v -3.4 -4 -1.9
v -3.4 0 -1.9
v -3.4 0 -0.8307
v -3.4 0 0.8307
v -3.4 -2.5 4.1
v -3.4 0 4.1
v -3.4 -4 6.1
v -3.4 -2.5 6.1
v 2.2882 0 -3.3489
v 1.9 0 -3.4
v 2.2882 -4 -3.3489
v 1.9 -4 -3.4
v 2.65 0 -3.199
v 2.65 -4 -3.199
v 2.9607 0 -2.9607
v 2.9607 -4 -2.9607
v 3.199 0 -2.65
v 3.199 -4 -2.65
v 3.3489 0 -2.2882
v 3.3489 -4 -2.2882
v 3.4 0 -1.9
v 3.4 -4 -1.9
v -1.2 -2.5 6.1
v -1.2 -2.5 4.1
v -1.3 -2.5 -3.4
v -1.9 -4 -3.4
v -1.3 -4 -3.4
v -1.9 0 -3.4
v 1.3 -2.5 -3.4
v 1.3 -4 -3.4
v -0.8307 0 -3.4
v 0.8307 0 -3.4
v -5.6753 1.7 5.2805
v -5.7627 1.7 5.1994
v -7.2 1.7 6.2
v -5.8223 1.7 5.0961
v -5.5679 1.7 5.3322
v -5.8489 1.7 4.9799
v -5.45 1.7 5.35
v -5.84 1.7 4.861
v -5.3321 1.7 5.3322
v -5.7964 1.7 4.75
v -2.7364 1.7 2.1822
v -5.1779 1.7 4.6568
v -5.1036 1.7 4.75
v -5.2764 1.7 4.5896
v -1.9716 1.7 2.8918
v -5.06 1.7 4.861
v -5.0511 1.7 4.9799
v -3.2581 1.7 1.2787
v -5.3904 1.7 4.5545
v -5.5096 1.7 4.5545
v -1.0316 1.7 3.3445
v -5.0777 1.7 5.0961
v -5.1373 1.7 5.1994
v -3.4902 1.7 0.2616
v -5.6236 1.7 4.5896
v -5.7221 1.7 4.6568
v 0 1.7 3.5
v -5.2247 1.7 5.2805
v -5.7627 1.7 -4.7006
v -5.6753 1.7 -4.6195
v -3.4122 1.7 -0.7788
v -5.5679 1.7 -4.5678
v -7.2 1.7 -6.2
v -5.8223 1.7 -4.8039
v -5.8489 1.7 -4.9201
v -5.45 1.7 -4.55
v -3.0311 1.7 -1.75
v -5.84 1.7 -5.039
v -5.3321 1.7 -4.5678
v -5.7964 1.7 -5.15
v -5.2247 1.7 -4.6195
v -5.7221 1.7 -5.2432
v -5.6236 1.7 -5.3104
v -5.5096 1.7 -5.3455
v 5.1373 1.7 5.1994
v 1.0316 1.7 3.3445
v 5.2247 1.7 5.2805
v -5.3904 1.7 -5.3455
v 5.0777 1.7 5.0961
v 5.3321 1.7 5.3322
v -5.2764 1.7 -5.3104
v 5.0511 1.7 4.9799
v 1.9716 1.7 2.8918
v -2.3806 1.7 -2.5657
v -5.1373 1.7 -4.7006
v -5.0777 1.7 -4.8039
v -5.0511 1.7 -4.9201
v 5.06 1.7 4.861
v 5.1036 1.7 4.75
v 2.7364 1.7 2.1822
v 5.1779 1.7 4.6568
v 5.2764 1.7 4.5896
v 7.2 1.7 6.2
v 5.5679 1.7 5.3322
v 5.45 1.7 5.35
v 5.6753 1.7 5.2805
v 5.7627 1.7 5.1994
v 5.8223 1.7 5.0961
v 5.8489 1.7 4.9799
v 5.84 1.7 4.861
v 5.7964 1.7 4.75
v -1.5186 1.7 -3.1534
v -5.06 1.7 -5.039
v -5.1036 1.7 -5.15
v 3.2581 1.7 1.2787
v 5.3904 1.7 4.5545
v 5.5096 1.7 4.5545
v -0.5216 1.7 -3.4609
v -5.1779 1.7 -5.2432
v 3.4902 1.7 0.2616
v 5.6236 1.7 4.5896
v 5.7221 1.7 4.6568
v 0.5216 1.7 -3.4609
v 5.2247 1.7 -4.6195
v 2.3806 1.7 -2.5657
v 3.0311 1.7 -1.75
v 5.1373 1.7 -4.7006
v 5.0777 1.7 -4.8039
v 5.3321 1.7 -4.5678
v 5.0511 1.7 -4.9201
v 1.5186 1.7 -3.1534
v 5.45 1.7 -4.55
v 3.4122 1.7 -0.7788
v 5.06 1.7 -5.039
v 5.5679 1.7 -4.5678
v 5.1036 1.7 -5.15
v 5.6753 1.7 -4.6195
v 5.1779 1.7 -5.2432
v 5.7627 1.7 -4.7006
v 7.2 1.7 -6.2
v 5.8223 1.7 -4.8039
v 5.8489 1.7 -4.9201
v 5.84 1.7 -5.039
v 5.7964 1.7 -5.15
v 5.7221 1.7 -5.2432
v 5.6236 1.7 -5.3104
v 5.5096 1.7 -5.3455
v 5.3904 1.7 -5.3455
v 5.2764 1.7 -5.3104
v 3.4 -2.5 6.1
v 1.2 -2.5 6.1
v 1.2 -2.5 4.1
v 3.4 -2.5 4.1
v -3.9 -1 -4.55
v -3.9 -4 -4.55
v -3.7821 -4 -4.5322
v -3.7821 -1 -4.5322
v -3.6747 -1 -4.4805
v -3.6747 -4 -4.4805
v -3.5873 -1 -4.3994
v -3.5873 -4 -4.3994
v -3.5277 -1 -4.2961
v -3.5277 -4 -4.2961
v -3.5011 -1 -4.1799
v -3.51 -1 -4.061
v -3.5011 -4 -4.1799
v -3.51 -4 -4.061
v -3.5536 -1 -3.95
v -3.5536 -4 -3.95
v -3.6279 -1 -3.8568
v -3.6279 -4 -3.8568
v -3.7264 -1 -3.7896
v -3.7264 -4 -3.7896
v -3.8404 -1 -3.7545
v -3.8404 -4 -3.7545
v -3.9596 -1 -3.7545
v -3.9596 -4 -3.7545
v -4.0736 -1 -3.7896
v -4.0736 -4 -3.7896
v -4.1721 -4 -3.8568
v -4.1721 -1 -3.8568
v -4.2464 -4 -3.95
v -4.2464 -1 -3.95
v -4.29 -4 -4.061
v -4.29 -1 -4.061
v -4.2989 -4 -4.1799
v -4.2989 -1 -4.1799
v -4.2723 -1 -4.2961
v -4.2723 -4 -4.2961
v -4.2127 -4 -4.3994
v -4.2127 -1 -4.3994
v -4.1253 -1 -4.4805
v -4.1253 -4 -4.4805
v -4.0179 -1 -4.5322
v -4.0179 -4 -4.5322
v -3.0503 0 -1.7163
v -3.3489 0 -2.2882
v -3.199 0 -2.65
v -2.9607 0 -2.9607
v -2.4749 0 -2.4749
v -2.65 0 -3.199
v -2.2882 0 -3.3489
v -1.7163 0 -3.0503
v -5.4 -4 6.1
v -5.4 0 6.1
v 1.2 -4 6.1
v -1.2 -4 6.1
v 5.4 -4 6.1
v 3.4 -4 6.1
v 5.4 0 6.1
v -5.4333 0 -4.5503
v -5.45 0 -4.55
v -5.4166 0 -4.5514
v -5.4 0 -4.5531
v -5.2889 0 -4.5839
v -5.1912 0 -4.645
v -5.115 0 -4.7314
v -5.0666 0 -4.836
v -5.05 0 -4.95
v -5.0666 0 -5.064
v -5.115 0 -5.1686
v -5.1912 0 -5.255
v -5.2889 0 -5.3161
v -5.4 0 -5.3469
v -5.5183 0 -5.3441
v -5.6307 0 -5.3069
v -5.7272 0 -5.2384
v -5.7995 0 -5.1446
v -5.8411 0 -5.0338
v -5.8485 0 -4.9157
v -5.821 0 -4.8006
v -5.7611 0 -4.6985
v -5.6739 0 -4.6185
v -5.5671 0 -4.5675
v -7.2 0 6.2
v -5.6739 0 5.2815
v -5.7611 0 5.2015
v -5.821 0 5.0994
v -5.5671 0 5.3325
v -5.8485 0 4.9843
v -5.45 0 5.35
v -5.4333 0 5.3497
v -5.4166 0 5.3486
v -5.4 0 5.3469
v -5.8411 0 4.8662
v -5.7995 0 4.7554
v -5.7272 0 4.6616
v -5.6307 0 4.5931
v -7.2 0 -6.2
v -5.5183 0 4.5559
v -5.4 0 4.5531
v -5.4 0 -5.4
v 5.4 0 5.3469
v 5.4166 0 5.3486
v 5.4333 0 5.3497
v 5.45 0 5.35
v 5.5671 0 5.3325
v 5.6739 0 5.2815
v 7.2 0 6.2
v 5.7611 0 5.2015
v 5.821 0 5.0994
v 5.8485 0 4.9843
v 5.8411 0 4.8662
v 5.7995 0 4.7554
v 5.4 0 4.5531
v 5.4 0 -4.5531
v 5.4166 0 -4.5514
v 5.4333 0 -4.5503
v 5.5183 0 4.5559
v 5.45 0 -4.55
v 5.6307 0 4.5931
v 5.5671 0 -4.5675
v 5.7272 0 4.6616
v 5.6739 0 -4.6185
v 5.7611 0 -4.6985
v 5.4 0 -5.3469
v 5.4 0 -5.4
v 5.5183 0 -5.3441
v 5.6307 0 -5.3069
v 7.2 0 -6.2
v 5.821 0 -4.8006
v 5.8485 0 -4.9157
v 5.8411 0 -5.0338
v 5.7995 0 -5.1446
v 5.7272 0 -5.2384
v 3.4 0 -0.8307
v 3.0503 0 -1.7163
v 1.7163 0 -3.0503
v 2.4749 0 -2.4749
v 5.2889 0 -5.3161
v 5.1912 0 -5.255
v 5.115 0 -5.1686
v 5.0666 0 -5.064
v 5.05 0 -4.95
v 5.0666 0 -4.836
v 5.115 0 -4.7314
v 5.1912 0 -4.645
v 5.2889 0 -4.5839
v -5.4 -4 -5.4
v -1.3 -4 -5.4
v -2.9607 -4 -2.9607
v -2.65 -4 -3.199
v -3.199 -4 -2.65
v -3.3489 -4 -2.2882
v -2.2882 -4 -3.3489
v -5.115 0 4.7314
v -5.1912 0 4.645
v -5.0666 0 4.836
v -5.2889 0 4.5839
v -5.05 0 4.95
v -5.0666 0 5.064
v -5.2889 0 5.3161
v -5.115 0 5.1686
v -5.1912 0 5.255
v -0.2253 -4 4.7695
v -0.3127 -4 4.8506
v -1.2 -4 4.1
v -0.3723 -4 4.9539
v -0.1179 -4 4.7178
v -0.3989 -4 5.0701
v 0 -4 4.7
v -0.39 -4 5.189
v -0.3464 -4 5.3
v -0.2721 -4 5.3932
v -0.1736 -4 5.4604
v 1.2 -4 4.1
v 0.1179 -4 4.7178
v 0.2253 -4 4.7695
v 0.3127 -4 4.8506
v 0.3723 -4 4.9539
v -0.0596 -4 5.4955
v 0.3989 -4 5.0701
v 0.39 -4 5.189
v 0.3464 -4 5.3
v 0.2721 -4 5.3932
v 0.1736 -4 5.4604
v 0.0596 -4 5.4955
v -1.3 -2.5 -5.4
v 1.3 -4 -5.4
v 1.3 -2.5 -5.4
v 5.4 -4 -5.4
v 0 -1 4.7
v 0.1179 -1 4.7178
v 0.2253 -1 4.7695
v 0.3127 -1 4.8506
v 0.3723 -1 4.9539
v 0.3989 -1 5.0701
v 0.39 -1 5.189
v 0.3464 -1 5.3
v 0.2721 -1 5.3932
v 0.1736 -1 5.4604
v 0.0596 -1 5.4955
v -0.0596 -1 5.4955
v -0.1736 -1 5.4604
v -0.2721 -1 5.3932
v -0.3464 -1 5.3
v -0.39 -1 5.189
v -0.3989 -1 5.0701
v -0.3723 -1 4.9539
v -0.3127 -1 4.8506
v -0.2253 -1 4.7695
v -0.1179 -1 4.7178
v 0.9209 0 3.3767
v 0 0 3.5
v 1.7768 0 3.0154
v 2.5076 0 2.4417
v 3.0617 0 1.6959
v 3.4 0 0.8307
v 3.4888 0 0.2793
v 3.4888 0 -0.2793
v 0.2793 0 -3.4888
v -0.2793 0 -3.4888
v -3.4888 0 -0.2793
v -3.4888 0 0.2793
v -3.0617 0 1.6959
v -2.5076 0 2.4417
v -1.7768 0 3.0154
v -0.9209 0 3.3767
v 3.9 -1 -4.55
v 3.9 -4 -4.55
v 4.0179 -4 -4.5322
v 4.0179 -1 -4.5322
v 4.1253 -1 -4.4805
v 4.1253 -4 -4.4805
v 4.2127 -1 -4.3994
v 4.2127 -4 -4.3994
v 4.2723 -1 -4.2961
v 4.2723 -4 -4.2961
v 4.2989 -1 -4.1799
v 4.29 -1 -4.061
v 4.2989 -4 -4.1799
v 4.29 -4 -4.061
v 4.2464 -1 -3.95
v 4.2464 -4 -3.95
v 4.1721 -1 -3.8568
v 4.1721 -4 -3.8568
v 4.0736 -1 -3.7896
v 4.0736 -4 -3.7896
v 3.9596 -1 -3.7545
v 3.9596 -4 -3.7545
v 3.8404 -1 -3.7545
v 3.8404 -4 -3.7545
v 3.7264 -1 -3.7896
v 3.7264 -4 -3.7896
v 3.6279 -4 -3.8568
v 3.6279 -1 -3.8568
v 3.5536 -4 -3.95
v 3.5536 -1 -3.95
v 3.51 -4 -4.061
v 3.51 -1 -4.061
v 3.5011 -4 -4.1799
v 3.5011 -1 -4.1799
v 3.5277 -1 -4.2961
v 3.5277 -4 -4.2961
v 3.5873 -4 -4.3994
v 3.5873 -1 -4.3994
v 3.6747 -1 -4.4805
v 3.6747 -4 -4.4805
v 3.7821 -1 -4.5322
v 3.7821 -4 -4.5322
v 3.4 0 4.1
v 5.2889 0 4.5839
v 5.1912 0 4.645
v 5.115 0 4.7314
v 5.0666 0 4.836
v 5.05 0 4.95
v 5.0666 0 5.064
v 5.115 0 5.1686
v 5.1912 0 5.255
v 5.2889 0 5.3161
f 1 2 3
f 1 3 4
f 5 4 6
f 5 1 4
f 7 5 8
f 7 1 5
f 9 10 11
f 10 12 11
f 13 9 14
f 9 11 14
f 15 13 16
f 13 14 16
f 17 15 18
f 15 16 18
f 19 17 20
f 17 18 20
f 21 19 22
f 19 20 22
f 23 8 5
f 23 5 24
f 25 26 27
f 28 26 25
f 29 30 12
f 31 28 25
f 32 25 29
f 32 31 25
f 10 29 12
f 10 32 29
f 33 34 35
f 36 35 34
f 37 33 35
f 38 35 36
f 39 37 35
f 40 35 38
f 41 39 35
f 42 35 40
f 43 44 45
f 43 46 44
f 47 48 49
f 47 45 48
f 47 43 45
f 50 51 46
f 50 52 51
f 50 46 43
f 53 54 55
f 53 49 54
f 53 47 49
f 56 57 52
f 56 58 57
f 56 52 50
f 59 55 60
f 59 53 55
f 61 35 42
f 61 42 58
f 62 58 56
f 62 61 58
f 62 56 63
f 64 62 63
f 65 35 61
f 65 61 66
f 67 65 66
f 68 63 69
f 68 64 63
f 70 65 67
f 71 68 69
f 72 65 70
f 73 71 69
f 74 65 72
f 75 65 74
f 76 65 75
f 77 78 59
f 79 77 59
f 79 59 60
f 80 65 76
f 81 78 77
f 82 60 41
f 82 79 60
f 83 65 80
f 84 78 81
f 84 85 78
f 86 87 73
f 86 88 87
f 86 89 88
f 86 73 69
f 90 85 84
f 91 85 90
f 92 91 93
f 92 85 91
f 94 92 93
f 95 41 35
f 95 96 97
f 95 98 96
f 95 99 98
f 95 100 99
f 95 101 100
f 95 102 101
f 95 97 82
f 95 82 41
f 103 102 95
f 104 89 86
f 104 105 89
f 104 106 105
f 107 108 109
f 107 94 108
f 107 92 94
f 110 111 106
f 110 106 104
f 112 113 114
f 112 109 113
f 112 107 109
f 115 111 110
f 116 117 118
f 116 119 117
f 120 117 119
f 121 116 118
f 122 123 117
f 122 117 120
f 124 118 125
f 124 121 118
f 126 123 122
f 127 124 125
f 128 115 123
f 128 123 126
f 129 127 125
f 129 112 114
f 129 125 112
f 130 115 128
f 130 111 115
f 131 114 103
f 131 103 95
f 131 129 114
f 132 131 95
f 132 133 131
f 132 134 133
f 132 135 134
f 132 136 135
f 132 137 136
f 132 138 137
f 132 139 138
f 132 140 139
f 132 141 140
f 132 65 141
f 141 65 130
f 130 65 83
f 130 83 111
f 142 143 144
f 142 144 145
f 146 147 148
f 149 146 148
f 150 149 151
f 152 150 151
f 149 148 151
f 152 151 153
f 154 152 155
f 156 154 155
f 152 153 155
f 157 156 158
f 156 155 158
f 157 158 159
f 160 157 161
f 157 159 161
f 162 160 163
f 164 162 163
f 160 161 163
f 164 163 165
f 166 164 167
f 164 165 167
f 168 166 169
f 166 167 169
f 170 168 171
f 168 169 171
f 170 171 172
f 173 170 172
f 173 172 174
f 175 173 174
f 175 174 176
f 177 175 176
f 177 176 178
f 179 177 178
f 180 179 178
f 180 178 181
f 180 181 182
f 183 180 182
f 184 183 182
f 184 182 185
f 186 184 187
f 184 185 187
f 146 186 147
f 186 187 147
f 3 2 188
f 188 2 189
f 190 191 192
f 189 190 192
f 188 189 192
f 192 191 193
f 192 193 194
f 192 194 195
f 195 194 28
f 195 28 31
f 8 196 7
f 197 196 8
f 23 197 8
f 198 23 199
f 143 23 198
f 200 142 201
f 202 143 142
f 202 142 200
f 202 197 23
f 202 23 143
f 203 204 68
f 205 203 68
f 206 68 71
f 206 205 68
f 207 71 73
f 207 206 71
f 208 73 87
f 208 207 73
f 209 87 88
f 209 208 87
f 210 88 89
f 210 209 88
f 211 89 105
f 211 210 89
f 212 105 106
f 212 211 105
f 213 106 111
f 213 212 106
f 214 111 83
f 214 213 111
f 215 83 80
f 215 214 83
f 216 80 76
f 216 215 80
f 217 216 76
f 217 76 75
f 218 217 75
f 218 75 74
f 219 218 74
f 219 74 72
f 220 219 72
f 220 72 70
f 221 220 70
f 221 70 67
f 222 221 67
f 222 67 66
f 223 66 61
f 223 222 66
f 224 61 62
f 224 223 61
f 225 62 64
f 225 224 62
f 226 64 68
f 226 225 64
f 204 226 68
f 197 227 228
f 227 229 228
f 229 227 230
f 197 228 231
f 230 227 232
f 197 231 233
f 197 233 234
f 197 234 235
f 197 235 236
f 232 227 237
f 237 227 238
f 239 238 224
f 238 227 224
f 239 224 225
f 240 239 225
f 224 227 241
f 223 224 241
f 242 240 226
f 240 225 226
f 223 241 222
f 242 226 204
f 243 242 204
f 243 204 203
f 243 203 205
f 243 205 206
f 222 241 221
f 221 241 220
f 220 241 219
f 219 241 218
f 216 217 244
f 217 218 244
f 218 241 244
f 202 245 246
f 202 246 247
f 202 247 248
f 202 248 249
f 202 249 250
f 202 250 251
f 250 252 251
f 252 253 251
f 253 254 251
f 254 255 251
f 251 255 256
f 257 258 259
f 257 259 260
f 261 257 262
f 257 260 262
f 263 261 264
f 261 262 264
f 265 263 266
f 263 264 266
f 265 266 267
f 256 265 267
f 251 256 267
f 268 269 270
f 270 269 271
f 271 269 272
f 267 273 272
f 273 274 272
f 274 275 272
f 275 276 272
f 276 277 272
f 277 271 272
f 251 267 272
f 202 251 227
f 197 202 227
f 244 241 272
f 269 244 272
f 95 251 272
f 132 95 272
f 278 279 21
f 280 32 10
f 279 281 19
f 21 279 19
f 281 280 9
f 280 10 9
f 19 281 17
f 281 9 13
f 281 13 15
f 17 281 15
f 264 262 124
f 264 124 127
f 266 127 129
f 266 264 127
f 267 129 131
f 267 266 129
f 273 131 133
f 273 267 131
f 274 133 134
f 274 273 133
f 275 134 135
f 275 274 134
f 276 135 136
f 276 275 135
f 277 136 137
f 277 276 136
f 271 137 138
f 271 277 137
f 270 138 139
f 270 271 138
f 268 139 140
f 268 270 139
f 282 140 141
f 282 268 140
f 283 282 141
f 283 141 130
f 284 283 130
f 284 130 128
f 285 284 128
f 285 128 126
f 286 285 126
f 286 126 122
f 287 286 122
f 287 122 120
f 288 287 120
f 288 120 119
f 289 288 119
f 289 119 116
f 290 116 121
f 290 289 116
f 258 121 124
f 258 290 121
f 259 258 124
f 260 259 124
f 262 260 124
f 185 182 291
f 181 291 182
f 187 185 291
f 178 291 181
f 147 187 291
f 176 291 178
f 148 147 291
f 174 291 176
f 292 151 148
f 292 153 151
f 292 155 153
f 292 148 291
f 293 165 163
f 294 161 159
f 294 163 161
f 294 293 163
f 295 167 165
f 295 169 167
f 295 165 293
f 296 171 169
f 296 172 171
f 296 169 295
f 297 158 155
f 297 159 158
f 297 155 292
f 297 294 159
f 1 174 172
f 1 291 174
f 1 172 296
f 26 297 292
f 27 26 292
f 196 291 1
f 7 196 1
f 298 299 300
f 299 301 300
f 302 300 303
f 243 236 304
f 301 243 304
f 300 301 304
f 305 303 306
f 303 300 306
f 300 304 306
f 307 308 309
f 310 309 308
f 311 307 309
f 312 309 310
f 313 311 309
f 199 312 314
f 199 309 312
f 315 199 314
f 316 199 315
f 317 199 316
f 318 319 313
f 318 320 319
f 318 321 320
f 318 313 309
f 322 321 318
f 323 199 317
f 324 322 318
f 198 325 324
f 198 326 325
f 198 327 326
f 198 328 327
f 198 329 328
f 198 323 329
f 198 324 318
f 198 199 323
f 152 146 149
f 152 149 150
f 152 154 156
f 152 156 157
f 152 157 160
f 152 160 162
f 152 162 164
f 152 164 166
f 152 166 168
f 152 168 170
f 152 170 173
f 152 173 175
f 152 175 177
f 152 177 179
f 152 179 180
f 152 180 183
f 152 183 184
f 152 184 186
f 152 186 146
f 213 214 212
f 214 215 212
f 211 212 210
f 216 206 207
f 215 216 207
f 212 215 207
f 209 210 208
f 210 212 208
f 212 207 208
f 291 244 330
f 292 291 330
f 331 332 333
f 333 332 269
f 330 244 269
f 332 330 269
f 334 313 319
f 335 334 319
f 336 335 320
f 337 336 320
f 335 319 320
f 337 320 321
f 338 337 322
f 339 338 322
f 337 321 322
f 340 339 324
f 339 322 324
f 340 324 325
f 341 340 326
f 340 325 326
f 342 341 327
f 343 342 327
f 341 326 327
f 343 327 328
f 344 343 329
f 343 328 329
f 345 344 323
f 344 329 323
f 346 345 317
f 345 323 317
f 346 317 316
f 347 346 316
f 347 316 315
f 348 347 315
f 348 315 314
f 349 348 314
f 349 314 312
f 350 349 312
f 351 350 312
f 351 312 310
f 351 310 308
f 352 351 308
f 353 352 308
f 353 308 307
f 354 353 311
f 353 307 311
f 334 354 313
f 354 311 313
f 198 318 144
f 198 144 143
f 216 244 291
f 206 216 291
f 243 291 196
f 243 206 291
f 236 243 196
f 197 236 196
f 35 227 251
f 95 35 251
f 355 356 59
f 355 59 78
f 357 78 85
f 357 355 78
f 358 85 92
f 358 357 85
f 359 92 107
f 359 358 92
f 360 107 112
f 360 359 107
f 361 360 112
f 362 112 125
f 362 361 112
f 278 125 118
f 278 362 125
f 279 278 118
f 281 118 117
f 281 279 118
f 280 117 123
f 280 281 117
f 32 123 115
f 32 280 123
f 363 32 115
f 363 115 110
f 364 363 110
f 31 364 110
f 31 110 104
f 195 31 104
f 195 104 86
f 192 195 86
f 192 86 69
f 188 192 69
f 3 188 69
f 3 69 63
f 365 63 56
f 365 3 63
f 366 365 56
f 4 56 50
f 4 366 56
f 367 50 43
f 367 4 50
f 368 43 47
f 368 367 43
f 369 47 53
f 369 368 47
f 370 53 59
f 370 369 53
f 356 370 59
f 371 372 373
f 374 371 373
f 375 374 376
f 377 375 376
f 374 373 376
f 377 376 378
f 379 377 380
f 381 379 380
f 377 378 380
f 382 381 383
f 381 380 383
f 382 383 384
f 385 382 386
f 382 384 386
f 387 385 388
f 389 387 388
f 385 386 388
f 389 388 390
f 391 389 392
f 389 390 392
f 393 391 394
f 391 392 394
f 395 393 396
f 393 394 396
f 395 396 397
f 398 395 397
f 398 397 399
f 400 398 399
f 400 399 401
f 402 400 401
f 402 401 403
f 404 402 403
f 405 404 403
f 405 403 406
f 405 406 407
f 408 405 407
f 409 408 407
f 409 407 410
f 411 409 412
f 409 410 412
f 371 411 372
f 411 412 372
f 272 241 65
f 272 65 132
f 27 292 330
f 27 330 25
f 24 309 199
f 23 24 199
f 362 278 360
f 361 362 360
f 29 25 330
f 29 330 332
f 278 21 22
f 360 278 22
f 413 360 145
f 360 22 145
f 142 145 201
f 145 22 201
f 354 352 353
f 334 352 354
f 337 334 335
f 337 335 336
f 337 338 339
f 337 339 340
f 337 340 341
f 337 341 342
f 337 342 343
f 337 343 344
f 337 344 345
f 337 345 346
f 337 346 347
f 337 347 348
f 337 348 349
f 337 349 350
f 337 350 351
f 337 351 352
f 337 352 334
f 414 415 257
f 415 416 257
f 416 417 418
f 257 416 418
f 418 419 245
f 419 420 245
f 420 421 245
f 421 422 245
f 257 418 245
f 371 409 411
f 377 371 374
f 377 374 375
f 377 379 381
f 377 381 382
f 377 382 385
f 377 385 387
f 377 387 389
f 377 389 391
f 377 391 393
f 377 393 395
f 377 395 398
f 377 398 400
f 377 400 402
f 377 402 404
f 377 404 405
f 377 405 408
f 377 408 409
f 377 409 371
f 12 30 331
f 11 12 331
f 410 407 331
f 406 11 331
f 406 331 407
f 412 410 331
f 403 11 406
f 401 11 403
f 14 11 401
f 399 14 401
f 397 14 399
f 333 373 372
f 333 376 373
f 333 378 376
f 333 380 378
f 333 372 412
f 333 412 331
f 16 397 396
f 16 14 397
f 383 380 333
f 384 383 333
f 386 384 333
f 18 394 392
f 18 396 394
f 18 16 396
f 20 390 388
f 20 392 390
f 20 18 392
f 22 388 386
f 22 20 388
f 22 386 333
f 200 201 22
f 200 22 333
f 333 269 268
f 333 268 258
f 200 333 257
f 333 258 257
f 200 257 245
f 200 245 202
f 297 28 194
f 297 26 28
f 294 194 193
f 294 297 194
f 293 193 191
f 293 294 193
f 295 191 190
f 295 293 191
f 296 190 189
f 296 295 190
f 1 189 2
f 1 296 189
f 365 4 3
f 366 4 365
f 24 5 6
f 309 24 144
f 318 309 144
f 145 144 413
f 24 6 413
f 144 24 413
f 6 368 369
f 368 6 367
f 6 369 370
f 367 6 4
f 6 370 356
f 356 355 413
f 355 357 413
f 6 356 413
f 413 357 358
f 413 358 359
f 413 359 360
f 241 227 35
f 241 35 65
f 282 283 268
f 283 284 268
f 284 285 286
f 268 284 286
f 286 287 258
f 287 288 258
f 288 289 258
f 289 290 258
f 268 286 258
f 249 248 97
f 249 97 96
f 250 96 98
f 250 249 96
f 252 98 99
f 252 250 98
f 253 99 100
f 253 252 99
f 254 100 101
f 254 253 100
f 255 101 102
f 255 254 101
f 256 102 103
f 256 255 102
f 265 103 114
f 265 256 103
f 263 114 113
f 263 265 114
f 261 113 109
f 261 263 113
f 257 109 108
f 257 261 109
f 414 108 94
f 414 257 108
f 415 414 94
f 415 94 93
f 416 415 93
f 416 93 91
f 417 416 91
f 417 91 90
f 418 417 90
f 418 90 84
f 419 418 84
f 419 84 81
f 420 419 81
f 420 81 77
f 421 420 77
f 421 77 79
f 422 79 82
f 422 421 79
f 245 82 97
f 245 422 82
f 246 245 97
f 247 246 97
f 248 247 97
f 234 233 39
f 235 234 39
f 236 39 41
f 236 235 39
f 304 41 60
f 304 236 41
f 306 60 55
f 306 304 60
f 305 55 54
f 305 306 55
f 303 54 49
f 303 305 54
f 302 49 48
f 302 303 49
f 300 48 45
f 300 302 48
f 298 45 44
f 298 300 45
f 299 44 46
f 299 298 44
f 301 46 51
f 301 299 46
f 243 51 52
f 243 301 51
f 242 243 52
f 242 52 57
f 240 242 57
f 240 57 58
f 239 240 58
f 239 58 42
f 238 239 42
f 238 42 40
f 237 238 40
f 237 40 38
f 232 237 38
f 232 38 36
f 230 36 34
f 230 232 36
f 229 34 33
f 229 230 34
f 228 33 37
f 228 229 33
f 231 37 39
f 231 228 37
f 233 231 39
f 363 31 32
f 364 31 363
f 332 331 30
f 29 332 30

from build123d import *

# Parameters (mm, degrees)
SKETCH_1_W          = 14.4
SKETCH_1_H          = 12.4
SKETCH_1_R          = 3.5
SKETCH_1_R_2        = 0.4
EXTRUDE_1_DEPTH     = 1.7
SKETCH_2_W          = 10.8
SKETCH_2_H          = 11.5
SKETCH_2_W_2        = 6.8
SKETCH_2_H_2        = 7.5
EXTRUDE_1_2_DEPTH   = 4
FILLET_1_R          = 1.5
SKETCH_3_W          = 2.2
SKETCH_3_H          = 2
SKETCH_3_W_2        = 2.6
CUT_EXTRUDE_1_DEPTH = 1.5
SKETCH_4_R          = 0.4
CUT_EXTRUDE_2_DEPTH = 3


with BuildPart() as part:
    # 草图1 → Extrude 1 (new body)
    with BuildSketch(Plane(origin=(0, 0, 0), x_dir=(1, 0, 0), z_dir=(0, 1, 0))):
        Rectangle(SKETCH_1_W, SKETCH_1_H)
        with Locations(Location((0, 0, 0), (0, 0, 270))):
            Circle(SKETCH_1_R, mode=Mode.SUBTRACT)
        with Locations(Location((5.45, -4.95, 0), (0, 0, 270))):
            Circle(SKETCH_1_R_2, mode=Mode.SUBTRACT)
        with Locations(Location((-5.45, -4.95, 0), (0, 0, 270))):
            Circle(SKETCH_1_R_2, mode=Mode.SUBTRACT)
        with Locations(Location((5.45, 4.95, 0), (0, 0, 270))):
            Circle(SKETCH_1_R_2, mode=Mode.SUBTRACT)
        with Locations(Location((-5.45, 4.95, 0), (0, 0, 270))):
            Circle(SKETCH_1_R_2, mode=Mode.SUBTRACT)
    extrude(amount=EXTRUDE_1_DEPTH)

    # 草图2 → Extrude 1 2 (add)
    with BuildSketch(Plane.XZ):
        with Locations((0, 0.35)):
            Rectangle(SKETCH_2_W, SKETCH_2_H)
        with Locations((0, 0.35)):
            Rectangle(SKETCH_2_W_2, SKETCH_2_H_2, mode=Mode.SUBTRACT)
    extrude(amount=EXTRUDE_1_2_DEPTH)

    # 圆角1
    fillet_1_edges = [part.edges().sort_by_distance(p)[0] for p in [
        (3.4, -2, -3.4),
        (-3.4, -2, -3.4),
    ]]
    fillet(fillet_1_edges, radius=FILLET_1_R)

    # 草图3 → 切除-拉伸1 (cut)
    with BuildSketch(Plane.XZ.offset(4)):
        with Locations((-2.3, 5.1)):
            Rectangle(SKETCH_3_W, SKETCH_3_H)
        with Locations((2.3, 5.1)):
            Rectangle(SKETCH_3_W, SKETCH_3_H)
        with Locations((0, -4.4)):
            Rectangle(SKETCH_3_W_2, SKETCH_3_H)
    extrude(amount=-CUT_EXTRUDE_1_DEPTH, mode=Mode.SUBTRACT)

    # 草图4 → 切除-拉伸2 (cut)
    with BuildSketch(Plane.XZ.offset(4)):
        with Locations(Location((-3.9, -4.15, 0), (0, 0, 270))):
            Circle(SKETCH_4_R)
        with Locations(Location((3.9, -4.15, 0), (0, 0, 270))):
            Circle(SKETCH_4_R)
        with Locations(Location((0, 5.1, 0), (0, 0, 270))):
            Circle(SKETCH_4_R)
    extrude(amount=-CUT_EXTRUDE_2_DEPTH, mode=Mode.SUBTRACT)


solid = part.part
